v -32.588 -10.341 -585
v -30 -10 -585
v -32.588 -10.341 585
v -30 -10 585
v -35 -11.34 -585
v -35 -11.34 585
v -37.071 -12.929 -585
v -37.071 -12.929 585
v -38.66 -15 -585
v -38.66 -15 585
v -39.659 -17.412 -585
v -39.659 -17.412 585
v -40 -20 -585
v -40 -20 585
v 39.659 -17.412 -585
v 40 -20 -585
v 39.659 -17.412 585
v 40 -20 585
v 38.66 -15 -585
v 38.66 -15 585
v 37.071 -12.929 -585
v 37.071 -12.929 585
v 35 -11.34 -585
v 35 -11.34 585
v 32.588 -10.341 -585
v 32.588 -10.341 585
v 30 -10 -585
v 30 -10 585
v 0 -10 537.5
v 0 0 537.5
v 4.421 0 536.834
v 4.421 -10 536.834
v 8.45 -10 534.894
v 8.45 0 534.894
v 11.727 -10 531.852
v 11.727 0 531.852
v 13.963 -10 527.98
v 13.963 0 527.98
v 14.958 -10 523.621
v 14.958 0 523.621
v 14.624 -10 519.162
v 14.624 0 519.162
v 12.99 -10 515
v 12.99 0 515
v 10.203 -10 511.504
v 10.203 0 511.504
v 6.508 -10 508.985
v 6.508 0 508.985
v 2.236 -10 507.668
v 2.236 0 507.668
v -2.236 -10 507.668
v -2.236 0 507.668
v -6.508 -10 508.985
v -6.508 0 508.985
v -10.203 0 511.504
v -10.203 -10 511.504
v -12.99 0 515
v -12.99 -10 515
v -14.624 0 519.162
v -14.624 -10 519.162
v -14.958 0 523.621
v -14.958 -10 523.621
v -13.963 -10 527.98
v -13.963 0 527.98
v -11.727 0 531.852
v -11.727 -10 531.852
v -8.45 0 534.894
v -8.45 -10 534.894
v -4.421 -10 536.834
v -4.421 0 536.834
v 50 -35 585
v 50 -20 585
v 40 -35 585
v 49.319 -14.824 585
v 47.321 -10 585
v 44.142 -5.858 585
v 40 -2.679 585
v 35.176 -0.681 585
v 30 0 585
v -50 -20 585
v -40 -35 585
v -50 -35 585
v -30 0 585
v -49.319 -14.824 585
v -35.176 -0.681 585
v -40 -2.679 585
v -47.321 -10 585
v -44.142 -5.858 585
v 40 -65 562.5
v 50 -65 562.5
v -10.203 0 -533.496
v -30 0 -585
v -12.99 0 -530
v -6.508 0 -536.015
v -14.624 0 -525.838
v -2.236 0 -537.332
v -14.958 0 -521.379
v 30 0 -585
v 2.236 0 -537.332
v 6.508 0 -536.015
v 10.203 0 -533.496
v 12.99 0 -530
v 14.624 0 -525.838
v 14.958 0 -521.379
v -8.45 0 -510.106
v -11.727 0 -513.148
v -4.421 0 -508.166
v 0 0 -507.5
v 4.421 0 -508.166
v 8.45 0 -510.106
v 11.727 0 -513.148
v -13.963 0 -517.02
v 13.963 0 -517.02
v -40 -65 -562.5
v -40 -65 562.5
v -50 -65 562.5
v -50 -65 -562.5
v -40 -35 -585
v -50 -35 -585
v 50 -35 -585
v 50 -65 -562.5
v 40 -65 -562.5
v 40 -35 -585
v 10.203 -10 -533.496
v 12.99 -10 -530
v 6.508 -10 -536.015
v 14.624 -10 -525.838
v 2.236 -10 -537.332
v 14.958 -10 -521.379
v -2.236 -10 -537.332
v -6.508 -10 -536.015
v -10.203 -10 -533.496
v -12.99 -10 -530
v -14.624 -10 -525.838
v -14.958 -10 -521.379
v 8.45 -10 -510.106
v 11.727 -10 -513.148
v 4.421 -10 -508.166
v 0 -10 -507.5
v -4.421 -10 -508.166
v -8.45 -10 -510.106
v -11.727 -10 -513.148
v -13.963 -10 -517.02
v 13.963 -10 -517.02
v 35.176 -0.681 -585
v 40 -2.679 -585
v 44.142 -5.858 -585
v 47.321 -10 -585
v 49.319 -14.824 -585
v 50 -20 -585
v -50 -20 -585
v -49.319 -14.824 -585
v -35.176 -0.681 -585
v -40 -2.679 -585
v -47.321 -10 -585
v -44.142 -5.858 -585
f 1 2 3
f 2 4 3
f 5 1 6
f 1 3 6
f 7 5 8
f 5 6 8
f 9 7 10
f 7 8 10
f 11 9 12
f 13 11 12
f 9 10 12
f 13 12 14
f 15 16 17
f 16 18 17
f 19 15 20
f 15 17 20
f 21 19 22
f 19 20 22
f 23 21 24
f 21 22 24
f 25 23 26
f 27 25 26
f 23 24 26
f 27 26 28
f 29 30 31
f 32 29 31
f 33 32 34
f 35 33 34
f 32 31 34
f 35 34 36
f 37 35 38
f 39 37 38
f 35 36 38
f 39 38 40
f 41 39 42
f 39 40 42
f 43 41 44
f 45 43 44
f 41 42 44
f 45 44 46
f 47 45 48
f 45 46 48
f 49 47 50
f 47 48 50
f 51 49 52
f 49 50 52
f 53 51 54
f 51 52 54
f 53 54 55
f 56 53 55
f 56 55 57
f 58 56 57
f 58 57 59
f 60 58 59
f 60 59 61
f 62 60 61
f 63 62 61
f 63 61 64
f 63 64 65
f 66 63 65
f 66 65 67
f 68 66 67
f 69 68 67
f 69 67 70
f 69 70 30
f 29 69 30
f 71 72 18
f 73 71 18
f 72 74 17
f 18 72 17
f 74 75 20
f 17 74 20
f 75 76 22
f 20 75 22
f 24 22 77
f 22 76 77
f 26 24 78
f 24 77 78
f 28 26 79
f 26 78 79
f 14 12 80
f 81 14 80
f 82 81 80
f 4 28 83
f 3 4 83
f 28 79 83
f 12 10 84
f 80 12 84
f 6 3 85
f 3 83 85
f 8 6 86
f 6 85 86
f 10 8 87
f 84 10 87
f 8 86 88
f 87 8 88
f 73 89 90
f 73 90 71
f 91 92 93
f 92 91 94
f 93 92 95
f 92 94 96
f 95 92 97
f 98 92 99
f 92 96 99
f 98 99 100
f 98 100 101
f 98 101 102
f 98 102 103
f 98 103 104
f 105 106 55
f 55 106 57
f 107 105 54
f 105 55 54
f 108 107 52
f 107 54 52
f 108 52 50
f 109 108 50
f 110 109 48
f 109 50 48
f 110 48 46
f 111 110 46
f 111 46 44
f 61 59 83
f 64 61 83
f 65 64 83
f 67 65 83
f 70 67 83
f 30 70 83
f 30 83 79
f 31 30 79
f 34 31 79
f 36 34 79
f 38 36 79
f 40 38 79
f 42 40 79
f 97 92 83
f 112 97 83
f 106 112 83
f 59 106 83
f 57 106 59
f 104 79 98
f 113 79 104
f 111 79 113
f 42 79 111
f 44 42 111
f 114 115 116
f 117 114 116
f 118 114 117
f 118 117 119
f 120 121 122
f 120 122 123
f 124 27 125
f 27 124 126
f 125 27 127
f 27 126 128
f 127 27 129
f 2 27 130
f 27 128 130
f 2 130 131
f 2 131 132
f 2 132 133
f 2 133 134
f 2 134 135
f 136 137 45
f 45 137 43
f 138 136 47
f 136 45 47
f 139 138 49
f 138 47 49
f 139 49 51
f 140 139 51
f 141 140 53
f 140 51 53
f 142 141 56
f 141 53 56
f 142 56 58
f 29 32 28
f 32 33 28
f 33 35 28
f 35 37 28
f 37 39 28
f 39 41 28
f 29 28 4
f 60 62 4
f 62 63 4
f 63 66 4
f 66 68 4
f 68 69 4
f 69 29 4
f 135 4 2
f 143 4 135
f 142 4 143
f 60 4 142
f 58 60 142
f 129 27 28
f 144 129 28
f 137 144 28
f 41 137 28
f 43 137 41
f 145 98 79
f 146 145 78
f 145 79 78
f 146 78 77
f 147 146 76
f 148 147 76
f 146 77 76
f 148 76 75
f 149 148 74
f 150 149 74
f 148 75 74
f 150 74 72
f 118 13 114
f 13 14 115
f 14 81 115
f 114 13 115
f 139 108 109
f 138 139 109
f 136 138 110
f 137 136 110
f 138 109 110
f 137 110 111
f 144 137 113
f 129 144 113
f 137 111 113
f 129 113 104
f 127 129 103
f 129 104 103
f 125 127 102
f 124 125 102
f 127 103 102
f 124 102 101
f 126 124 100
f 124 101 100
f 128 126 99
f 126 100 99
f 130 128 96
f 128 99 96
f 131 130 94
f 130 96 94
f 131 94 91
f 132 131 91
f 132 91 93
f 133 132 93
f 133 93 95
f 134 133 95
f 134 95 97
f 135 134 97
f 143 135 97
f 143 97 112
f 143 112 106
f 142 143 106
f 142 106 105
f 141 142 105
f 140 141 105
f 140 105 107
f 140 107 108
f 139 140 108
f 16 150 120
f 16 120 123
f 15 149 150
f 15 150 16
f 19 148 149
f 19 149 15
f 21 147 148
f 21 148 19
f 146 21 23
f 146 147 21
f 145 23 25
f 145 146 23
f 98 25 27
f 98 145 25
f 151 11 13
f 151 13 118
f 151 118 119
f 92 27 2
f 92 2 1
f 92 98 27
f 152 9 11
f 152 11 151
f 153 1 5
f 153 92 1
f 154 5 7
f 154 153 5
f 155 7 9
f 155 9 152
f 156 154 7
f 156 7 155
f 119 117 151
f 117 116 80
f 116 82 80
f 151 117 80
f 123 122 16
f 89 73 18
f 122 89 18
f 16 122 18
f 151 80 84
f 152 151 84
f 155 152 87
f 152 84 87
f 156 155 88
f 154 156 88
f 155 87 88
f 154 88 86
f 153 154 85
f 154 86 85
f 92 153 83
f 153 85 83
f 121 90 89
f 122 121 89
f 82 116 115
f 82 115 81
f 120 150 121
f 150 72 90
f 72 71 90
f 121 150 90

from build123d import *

# Parameters (mm, degrees)
EXTRUDE_1_DEPTH     = 585
CUT_EXTRUDE_1_DEPTH = 350
SKETCH_3_R          = 15
CUT_EXTRUDE_2_DEPTH = 591.719899783


with BuildPart() as part:
    # 草图1 → 凸台-拉伸1 (new, symmetric)
    with BuildSketch(Plane.XY):
        with BuildLine():
            Line((-30, 0), (30, 0))
            ThreePointArc((30, 0), (44.142135624, -5.857864376), (50, -20))
            Line((50, -20), (50, -65))
            Line((50, -65), (40, -65))
            Line((40, -65), (40, -20))
            ThreePointArc((40, -20), (37.071067812, -12.928932188), (30, -10))
            Line((30, -10), (-30, -10))
            ThreePointArc((-30, -10), (-37.071067812, -12.928932188), (-40, -20))
            Line((-40, -20), (-40, -65))
            Line((-40, -65), (-50, -65))
            Line((-50, -65), (-50, -20))
            ThreePointArc((-50, -20), (-44.142135624, -5.857864376), (-30, 0))
        make_face()
    extrude(amount=EXTRUDE_1_DEPTH, both=True)

    # 草图2 → 切除-拉伸1 (cut, symmetric)
    with BuildSketch(Plane(origin=(0, 0, 0), x_dir=(0, 0, -1), z_dir=(1, 0, 0))):
        Polygon((-585, -35), (-585, -65), (-562.5, -65), align=None)
        Polygon((562.5, -65), (585, -35), (585, -65), align=None)
    extrude(amount=CUT_EXTRUDE_1_DEPTH, both=True, mode=Mode.SUBTRACT)

    # 草图3 → 切除-拉伸2 (cut, through all)
    with BuildSketch(Plane(origin=(0, 0, 0), x_dir=(1, 0, 0), z_dir=(0, 1, 0))):
        with Locations(Location((0, 522.5, 0), (0, 0, 270))):
            Circle(SKETCH_3_R)
        with Locations(Location((0, -522.5, 0), (0, 0, 270))):
            Circle(SKETCH_3_R)
    extrude(amount=-CUT_EXTRUDE_2_DEPTH, mode=Mode.SUBTRACT)


solid = part.part
